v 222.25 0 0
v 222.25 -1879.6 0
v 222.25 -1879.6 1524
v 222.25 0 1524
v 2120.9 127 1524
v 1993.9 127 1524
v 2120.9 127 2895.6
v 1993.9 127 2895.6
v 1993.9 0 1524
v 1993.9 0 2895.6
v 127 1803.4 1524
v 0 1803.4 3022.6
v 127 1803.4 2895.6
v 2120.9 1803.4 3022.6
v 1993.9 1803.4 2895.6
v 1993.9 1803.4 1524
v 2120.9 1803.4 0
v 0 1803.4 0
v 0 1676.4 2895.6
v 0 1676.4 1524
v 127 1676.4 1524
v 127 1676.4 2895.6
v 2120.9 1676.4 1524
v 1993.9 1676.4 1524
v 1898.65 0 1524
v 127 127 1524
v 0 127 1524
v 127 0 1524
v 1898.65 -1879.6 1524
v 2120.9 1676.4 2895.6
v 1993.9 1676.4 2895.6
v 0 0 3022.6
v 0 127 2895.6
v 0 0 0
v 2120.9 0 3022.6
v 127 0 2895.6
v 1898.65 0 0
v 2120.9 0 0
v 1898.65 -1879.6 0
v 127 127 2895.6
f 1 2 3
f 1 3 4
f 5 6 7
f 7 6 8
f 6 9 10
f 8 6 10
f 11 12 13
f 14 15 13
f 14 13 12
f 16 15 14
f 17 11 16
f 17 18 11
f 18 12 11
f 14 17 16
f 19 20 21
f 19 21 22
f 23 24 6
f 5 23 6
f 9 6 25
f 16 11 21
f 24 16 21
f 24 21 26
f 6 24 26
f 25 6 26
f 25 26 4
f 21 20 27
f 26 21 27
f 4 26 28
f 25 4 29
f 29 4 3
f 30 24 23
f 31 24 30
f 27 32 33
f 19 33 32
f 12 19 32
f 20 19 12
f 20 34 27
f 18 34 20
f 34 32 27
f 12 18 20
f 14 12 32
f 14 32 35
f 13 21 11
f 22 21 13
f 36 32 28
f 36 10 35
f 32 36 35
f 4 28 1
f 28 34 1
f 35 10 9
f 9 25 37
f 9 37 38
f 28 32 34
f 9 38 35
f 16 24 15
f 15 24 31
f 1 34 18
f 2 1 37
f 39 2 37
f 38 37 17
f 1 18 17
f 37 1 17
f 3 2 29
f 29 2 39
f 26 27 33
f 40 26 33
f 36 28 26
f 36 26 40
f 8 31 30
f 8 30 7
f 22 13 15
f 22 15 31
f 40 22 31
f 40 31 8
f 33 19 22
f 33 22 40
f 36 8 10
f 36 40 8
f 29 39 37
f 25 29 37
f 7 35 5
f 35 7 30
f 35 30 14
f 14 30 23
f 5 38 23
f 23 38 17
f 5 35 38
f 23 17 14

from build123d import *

# Parameters (mm, degrees)
F0_W     = 2120.9
F0_H     = 1803.4
F1_DEPTH = 3022.6
F2_W     = 1676.4
F2_H     = 1879.6
F3_DEPTH = 1524
F4_W     = 1866.9
F4_H     = 1371.6
F5_DEPTH = 1803.401
F6_W     = 1549.4
F6_H     = 1371.6
F7_DEPTH = 2120.901


with BuildPart() as f1:
    # F0 (on Top) → F1 (new body)
    with BuildSketch(Plane.XY):
        with Locations((1060.45, 901.7)):
            Rectangle(F0_W, F0_H)
    extrude(amount=F1_DEPTH)

    # F2 (on Top) → F3 (join)
    with BuildSketch(Plane.XY):
        with Locations((1060.45, -939.8)):
            Rectangle(F2_W, F2_H)
    extrude(amount=F3_DEPTH)

    # F4 (on face) → F5 (cut, through all)
    with BuildSketch(Plane.XZ):
        with Locations((1060.45, 2209.8)):
            Rectangle(F4_W, F4_H)
    extrude(amount=-F5_DEPTH, mode=Mode.SUBTRACT)

    # F6 (on face) → F7 (cut, through all)
    with BuildSketch(Plane(origin=(0, 0, 0), x_dir=(0, -1, 0), z_dir=(-1, 0, 0))):
        with Locations((-901.7, 2209.8)):
            Rectangle(F6_W, F6_H)
    extrude(amount=-F7_DEPTH, mode=Mode.SUBTRACT)


solid = f1.part
